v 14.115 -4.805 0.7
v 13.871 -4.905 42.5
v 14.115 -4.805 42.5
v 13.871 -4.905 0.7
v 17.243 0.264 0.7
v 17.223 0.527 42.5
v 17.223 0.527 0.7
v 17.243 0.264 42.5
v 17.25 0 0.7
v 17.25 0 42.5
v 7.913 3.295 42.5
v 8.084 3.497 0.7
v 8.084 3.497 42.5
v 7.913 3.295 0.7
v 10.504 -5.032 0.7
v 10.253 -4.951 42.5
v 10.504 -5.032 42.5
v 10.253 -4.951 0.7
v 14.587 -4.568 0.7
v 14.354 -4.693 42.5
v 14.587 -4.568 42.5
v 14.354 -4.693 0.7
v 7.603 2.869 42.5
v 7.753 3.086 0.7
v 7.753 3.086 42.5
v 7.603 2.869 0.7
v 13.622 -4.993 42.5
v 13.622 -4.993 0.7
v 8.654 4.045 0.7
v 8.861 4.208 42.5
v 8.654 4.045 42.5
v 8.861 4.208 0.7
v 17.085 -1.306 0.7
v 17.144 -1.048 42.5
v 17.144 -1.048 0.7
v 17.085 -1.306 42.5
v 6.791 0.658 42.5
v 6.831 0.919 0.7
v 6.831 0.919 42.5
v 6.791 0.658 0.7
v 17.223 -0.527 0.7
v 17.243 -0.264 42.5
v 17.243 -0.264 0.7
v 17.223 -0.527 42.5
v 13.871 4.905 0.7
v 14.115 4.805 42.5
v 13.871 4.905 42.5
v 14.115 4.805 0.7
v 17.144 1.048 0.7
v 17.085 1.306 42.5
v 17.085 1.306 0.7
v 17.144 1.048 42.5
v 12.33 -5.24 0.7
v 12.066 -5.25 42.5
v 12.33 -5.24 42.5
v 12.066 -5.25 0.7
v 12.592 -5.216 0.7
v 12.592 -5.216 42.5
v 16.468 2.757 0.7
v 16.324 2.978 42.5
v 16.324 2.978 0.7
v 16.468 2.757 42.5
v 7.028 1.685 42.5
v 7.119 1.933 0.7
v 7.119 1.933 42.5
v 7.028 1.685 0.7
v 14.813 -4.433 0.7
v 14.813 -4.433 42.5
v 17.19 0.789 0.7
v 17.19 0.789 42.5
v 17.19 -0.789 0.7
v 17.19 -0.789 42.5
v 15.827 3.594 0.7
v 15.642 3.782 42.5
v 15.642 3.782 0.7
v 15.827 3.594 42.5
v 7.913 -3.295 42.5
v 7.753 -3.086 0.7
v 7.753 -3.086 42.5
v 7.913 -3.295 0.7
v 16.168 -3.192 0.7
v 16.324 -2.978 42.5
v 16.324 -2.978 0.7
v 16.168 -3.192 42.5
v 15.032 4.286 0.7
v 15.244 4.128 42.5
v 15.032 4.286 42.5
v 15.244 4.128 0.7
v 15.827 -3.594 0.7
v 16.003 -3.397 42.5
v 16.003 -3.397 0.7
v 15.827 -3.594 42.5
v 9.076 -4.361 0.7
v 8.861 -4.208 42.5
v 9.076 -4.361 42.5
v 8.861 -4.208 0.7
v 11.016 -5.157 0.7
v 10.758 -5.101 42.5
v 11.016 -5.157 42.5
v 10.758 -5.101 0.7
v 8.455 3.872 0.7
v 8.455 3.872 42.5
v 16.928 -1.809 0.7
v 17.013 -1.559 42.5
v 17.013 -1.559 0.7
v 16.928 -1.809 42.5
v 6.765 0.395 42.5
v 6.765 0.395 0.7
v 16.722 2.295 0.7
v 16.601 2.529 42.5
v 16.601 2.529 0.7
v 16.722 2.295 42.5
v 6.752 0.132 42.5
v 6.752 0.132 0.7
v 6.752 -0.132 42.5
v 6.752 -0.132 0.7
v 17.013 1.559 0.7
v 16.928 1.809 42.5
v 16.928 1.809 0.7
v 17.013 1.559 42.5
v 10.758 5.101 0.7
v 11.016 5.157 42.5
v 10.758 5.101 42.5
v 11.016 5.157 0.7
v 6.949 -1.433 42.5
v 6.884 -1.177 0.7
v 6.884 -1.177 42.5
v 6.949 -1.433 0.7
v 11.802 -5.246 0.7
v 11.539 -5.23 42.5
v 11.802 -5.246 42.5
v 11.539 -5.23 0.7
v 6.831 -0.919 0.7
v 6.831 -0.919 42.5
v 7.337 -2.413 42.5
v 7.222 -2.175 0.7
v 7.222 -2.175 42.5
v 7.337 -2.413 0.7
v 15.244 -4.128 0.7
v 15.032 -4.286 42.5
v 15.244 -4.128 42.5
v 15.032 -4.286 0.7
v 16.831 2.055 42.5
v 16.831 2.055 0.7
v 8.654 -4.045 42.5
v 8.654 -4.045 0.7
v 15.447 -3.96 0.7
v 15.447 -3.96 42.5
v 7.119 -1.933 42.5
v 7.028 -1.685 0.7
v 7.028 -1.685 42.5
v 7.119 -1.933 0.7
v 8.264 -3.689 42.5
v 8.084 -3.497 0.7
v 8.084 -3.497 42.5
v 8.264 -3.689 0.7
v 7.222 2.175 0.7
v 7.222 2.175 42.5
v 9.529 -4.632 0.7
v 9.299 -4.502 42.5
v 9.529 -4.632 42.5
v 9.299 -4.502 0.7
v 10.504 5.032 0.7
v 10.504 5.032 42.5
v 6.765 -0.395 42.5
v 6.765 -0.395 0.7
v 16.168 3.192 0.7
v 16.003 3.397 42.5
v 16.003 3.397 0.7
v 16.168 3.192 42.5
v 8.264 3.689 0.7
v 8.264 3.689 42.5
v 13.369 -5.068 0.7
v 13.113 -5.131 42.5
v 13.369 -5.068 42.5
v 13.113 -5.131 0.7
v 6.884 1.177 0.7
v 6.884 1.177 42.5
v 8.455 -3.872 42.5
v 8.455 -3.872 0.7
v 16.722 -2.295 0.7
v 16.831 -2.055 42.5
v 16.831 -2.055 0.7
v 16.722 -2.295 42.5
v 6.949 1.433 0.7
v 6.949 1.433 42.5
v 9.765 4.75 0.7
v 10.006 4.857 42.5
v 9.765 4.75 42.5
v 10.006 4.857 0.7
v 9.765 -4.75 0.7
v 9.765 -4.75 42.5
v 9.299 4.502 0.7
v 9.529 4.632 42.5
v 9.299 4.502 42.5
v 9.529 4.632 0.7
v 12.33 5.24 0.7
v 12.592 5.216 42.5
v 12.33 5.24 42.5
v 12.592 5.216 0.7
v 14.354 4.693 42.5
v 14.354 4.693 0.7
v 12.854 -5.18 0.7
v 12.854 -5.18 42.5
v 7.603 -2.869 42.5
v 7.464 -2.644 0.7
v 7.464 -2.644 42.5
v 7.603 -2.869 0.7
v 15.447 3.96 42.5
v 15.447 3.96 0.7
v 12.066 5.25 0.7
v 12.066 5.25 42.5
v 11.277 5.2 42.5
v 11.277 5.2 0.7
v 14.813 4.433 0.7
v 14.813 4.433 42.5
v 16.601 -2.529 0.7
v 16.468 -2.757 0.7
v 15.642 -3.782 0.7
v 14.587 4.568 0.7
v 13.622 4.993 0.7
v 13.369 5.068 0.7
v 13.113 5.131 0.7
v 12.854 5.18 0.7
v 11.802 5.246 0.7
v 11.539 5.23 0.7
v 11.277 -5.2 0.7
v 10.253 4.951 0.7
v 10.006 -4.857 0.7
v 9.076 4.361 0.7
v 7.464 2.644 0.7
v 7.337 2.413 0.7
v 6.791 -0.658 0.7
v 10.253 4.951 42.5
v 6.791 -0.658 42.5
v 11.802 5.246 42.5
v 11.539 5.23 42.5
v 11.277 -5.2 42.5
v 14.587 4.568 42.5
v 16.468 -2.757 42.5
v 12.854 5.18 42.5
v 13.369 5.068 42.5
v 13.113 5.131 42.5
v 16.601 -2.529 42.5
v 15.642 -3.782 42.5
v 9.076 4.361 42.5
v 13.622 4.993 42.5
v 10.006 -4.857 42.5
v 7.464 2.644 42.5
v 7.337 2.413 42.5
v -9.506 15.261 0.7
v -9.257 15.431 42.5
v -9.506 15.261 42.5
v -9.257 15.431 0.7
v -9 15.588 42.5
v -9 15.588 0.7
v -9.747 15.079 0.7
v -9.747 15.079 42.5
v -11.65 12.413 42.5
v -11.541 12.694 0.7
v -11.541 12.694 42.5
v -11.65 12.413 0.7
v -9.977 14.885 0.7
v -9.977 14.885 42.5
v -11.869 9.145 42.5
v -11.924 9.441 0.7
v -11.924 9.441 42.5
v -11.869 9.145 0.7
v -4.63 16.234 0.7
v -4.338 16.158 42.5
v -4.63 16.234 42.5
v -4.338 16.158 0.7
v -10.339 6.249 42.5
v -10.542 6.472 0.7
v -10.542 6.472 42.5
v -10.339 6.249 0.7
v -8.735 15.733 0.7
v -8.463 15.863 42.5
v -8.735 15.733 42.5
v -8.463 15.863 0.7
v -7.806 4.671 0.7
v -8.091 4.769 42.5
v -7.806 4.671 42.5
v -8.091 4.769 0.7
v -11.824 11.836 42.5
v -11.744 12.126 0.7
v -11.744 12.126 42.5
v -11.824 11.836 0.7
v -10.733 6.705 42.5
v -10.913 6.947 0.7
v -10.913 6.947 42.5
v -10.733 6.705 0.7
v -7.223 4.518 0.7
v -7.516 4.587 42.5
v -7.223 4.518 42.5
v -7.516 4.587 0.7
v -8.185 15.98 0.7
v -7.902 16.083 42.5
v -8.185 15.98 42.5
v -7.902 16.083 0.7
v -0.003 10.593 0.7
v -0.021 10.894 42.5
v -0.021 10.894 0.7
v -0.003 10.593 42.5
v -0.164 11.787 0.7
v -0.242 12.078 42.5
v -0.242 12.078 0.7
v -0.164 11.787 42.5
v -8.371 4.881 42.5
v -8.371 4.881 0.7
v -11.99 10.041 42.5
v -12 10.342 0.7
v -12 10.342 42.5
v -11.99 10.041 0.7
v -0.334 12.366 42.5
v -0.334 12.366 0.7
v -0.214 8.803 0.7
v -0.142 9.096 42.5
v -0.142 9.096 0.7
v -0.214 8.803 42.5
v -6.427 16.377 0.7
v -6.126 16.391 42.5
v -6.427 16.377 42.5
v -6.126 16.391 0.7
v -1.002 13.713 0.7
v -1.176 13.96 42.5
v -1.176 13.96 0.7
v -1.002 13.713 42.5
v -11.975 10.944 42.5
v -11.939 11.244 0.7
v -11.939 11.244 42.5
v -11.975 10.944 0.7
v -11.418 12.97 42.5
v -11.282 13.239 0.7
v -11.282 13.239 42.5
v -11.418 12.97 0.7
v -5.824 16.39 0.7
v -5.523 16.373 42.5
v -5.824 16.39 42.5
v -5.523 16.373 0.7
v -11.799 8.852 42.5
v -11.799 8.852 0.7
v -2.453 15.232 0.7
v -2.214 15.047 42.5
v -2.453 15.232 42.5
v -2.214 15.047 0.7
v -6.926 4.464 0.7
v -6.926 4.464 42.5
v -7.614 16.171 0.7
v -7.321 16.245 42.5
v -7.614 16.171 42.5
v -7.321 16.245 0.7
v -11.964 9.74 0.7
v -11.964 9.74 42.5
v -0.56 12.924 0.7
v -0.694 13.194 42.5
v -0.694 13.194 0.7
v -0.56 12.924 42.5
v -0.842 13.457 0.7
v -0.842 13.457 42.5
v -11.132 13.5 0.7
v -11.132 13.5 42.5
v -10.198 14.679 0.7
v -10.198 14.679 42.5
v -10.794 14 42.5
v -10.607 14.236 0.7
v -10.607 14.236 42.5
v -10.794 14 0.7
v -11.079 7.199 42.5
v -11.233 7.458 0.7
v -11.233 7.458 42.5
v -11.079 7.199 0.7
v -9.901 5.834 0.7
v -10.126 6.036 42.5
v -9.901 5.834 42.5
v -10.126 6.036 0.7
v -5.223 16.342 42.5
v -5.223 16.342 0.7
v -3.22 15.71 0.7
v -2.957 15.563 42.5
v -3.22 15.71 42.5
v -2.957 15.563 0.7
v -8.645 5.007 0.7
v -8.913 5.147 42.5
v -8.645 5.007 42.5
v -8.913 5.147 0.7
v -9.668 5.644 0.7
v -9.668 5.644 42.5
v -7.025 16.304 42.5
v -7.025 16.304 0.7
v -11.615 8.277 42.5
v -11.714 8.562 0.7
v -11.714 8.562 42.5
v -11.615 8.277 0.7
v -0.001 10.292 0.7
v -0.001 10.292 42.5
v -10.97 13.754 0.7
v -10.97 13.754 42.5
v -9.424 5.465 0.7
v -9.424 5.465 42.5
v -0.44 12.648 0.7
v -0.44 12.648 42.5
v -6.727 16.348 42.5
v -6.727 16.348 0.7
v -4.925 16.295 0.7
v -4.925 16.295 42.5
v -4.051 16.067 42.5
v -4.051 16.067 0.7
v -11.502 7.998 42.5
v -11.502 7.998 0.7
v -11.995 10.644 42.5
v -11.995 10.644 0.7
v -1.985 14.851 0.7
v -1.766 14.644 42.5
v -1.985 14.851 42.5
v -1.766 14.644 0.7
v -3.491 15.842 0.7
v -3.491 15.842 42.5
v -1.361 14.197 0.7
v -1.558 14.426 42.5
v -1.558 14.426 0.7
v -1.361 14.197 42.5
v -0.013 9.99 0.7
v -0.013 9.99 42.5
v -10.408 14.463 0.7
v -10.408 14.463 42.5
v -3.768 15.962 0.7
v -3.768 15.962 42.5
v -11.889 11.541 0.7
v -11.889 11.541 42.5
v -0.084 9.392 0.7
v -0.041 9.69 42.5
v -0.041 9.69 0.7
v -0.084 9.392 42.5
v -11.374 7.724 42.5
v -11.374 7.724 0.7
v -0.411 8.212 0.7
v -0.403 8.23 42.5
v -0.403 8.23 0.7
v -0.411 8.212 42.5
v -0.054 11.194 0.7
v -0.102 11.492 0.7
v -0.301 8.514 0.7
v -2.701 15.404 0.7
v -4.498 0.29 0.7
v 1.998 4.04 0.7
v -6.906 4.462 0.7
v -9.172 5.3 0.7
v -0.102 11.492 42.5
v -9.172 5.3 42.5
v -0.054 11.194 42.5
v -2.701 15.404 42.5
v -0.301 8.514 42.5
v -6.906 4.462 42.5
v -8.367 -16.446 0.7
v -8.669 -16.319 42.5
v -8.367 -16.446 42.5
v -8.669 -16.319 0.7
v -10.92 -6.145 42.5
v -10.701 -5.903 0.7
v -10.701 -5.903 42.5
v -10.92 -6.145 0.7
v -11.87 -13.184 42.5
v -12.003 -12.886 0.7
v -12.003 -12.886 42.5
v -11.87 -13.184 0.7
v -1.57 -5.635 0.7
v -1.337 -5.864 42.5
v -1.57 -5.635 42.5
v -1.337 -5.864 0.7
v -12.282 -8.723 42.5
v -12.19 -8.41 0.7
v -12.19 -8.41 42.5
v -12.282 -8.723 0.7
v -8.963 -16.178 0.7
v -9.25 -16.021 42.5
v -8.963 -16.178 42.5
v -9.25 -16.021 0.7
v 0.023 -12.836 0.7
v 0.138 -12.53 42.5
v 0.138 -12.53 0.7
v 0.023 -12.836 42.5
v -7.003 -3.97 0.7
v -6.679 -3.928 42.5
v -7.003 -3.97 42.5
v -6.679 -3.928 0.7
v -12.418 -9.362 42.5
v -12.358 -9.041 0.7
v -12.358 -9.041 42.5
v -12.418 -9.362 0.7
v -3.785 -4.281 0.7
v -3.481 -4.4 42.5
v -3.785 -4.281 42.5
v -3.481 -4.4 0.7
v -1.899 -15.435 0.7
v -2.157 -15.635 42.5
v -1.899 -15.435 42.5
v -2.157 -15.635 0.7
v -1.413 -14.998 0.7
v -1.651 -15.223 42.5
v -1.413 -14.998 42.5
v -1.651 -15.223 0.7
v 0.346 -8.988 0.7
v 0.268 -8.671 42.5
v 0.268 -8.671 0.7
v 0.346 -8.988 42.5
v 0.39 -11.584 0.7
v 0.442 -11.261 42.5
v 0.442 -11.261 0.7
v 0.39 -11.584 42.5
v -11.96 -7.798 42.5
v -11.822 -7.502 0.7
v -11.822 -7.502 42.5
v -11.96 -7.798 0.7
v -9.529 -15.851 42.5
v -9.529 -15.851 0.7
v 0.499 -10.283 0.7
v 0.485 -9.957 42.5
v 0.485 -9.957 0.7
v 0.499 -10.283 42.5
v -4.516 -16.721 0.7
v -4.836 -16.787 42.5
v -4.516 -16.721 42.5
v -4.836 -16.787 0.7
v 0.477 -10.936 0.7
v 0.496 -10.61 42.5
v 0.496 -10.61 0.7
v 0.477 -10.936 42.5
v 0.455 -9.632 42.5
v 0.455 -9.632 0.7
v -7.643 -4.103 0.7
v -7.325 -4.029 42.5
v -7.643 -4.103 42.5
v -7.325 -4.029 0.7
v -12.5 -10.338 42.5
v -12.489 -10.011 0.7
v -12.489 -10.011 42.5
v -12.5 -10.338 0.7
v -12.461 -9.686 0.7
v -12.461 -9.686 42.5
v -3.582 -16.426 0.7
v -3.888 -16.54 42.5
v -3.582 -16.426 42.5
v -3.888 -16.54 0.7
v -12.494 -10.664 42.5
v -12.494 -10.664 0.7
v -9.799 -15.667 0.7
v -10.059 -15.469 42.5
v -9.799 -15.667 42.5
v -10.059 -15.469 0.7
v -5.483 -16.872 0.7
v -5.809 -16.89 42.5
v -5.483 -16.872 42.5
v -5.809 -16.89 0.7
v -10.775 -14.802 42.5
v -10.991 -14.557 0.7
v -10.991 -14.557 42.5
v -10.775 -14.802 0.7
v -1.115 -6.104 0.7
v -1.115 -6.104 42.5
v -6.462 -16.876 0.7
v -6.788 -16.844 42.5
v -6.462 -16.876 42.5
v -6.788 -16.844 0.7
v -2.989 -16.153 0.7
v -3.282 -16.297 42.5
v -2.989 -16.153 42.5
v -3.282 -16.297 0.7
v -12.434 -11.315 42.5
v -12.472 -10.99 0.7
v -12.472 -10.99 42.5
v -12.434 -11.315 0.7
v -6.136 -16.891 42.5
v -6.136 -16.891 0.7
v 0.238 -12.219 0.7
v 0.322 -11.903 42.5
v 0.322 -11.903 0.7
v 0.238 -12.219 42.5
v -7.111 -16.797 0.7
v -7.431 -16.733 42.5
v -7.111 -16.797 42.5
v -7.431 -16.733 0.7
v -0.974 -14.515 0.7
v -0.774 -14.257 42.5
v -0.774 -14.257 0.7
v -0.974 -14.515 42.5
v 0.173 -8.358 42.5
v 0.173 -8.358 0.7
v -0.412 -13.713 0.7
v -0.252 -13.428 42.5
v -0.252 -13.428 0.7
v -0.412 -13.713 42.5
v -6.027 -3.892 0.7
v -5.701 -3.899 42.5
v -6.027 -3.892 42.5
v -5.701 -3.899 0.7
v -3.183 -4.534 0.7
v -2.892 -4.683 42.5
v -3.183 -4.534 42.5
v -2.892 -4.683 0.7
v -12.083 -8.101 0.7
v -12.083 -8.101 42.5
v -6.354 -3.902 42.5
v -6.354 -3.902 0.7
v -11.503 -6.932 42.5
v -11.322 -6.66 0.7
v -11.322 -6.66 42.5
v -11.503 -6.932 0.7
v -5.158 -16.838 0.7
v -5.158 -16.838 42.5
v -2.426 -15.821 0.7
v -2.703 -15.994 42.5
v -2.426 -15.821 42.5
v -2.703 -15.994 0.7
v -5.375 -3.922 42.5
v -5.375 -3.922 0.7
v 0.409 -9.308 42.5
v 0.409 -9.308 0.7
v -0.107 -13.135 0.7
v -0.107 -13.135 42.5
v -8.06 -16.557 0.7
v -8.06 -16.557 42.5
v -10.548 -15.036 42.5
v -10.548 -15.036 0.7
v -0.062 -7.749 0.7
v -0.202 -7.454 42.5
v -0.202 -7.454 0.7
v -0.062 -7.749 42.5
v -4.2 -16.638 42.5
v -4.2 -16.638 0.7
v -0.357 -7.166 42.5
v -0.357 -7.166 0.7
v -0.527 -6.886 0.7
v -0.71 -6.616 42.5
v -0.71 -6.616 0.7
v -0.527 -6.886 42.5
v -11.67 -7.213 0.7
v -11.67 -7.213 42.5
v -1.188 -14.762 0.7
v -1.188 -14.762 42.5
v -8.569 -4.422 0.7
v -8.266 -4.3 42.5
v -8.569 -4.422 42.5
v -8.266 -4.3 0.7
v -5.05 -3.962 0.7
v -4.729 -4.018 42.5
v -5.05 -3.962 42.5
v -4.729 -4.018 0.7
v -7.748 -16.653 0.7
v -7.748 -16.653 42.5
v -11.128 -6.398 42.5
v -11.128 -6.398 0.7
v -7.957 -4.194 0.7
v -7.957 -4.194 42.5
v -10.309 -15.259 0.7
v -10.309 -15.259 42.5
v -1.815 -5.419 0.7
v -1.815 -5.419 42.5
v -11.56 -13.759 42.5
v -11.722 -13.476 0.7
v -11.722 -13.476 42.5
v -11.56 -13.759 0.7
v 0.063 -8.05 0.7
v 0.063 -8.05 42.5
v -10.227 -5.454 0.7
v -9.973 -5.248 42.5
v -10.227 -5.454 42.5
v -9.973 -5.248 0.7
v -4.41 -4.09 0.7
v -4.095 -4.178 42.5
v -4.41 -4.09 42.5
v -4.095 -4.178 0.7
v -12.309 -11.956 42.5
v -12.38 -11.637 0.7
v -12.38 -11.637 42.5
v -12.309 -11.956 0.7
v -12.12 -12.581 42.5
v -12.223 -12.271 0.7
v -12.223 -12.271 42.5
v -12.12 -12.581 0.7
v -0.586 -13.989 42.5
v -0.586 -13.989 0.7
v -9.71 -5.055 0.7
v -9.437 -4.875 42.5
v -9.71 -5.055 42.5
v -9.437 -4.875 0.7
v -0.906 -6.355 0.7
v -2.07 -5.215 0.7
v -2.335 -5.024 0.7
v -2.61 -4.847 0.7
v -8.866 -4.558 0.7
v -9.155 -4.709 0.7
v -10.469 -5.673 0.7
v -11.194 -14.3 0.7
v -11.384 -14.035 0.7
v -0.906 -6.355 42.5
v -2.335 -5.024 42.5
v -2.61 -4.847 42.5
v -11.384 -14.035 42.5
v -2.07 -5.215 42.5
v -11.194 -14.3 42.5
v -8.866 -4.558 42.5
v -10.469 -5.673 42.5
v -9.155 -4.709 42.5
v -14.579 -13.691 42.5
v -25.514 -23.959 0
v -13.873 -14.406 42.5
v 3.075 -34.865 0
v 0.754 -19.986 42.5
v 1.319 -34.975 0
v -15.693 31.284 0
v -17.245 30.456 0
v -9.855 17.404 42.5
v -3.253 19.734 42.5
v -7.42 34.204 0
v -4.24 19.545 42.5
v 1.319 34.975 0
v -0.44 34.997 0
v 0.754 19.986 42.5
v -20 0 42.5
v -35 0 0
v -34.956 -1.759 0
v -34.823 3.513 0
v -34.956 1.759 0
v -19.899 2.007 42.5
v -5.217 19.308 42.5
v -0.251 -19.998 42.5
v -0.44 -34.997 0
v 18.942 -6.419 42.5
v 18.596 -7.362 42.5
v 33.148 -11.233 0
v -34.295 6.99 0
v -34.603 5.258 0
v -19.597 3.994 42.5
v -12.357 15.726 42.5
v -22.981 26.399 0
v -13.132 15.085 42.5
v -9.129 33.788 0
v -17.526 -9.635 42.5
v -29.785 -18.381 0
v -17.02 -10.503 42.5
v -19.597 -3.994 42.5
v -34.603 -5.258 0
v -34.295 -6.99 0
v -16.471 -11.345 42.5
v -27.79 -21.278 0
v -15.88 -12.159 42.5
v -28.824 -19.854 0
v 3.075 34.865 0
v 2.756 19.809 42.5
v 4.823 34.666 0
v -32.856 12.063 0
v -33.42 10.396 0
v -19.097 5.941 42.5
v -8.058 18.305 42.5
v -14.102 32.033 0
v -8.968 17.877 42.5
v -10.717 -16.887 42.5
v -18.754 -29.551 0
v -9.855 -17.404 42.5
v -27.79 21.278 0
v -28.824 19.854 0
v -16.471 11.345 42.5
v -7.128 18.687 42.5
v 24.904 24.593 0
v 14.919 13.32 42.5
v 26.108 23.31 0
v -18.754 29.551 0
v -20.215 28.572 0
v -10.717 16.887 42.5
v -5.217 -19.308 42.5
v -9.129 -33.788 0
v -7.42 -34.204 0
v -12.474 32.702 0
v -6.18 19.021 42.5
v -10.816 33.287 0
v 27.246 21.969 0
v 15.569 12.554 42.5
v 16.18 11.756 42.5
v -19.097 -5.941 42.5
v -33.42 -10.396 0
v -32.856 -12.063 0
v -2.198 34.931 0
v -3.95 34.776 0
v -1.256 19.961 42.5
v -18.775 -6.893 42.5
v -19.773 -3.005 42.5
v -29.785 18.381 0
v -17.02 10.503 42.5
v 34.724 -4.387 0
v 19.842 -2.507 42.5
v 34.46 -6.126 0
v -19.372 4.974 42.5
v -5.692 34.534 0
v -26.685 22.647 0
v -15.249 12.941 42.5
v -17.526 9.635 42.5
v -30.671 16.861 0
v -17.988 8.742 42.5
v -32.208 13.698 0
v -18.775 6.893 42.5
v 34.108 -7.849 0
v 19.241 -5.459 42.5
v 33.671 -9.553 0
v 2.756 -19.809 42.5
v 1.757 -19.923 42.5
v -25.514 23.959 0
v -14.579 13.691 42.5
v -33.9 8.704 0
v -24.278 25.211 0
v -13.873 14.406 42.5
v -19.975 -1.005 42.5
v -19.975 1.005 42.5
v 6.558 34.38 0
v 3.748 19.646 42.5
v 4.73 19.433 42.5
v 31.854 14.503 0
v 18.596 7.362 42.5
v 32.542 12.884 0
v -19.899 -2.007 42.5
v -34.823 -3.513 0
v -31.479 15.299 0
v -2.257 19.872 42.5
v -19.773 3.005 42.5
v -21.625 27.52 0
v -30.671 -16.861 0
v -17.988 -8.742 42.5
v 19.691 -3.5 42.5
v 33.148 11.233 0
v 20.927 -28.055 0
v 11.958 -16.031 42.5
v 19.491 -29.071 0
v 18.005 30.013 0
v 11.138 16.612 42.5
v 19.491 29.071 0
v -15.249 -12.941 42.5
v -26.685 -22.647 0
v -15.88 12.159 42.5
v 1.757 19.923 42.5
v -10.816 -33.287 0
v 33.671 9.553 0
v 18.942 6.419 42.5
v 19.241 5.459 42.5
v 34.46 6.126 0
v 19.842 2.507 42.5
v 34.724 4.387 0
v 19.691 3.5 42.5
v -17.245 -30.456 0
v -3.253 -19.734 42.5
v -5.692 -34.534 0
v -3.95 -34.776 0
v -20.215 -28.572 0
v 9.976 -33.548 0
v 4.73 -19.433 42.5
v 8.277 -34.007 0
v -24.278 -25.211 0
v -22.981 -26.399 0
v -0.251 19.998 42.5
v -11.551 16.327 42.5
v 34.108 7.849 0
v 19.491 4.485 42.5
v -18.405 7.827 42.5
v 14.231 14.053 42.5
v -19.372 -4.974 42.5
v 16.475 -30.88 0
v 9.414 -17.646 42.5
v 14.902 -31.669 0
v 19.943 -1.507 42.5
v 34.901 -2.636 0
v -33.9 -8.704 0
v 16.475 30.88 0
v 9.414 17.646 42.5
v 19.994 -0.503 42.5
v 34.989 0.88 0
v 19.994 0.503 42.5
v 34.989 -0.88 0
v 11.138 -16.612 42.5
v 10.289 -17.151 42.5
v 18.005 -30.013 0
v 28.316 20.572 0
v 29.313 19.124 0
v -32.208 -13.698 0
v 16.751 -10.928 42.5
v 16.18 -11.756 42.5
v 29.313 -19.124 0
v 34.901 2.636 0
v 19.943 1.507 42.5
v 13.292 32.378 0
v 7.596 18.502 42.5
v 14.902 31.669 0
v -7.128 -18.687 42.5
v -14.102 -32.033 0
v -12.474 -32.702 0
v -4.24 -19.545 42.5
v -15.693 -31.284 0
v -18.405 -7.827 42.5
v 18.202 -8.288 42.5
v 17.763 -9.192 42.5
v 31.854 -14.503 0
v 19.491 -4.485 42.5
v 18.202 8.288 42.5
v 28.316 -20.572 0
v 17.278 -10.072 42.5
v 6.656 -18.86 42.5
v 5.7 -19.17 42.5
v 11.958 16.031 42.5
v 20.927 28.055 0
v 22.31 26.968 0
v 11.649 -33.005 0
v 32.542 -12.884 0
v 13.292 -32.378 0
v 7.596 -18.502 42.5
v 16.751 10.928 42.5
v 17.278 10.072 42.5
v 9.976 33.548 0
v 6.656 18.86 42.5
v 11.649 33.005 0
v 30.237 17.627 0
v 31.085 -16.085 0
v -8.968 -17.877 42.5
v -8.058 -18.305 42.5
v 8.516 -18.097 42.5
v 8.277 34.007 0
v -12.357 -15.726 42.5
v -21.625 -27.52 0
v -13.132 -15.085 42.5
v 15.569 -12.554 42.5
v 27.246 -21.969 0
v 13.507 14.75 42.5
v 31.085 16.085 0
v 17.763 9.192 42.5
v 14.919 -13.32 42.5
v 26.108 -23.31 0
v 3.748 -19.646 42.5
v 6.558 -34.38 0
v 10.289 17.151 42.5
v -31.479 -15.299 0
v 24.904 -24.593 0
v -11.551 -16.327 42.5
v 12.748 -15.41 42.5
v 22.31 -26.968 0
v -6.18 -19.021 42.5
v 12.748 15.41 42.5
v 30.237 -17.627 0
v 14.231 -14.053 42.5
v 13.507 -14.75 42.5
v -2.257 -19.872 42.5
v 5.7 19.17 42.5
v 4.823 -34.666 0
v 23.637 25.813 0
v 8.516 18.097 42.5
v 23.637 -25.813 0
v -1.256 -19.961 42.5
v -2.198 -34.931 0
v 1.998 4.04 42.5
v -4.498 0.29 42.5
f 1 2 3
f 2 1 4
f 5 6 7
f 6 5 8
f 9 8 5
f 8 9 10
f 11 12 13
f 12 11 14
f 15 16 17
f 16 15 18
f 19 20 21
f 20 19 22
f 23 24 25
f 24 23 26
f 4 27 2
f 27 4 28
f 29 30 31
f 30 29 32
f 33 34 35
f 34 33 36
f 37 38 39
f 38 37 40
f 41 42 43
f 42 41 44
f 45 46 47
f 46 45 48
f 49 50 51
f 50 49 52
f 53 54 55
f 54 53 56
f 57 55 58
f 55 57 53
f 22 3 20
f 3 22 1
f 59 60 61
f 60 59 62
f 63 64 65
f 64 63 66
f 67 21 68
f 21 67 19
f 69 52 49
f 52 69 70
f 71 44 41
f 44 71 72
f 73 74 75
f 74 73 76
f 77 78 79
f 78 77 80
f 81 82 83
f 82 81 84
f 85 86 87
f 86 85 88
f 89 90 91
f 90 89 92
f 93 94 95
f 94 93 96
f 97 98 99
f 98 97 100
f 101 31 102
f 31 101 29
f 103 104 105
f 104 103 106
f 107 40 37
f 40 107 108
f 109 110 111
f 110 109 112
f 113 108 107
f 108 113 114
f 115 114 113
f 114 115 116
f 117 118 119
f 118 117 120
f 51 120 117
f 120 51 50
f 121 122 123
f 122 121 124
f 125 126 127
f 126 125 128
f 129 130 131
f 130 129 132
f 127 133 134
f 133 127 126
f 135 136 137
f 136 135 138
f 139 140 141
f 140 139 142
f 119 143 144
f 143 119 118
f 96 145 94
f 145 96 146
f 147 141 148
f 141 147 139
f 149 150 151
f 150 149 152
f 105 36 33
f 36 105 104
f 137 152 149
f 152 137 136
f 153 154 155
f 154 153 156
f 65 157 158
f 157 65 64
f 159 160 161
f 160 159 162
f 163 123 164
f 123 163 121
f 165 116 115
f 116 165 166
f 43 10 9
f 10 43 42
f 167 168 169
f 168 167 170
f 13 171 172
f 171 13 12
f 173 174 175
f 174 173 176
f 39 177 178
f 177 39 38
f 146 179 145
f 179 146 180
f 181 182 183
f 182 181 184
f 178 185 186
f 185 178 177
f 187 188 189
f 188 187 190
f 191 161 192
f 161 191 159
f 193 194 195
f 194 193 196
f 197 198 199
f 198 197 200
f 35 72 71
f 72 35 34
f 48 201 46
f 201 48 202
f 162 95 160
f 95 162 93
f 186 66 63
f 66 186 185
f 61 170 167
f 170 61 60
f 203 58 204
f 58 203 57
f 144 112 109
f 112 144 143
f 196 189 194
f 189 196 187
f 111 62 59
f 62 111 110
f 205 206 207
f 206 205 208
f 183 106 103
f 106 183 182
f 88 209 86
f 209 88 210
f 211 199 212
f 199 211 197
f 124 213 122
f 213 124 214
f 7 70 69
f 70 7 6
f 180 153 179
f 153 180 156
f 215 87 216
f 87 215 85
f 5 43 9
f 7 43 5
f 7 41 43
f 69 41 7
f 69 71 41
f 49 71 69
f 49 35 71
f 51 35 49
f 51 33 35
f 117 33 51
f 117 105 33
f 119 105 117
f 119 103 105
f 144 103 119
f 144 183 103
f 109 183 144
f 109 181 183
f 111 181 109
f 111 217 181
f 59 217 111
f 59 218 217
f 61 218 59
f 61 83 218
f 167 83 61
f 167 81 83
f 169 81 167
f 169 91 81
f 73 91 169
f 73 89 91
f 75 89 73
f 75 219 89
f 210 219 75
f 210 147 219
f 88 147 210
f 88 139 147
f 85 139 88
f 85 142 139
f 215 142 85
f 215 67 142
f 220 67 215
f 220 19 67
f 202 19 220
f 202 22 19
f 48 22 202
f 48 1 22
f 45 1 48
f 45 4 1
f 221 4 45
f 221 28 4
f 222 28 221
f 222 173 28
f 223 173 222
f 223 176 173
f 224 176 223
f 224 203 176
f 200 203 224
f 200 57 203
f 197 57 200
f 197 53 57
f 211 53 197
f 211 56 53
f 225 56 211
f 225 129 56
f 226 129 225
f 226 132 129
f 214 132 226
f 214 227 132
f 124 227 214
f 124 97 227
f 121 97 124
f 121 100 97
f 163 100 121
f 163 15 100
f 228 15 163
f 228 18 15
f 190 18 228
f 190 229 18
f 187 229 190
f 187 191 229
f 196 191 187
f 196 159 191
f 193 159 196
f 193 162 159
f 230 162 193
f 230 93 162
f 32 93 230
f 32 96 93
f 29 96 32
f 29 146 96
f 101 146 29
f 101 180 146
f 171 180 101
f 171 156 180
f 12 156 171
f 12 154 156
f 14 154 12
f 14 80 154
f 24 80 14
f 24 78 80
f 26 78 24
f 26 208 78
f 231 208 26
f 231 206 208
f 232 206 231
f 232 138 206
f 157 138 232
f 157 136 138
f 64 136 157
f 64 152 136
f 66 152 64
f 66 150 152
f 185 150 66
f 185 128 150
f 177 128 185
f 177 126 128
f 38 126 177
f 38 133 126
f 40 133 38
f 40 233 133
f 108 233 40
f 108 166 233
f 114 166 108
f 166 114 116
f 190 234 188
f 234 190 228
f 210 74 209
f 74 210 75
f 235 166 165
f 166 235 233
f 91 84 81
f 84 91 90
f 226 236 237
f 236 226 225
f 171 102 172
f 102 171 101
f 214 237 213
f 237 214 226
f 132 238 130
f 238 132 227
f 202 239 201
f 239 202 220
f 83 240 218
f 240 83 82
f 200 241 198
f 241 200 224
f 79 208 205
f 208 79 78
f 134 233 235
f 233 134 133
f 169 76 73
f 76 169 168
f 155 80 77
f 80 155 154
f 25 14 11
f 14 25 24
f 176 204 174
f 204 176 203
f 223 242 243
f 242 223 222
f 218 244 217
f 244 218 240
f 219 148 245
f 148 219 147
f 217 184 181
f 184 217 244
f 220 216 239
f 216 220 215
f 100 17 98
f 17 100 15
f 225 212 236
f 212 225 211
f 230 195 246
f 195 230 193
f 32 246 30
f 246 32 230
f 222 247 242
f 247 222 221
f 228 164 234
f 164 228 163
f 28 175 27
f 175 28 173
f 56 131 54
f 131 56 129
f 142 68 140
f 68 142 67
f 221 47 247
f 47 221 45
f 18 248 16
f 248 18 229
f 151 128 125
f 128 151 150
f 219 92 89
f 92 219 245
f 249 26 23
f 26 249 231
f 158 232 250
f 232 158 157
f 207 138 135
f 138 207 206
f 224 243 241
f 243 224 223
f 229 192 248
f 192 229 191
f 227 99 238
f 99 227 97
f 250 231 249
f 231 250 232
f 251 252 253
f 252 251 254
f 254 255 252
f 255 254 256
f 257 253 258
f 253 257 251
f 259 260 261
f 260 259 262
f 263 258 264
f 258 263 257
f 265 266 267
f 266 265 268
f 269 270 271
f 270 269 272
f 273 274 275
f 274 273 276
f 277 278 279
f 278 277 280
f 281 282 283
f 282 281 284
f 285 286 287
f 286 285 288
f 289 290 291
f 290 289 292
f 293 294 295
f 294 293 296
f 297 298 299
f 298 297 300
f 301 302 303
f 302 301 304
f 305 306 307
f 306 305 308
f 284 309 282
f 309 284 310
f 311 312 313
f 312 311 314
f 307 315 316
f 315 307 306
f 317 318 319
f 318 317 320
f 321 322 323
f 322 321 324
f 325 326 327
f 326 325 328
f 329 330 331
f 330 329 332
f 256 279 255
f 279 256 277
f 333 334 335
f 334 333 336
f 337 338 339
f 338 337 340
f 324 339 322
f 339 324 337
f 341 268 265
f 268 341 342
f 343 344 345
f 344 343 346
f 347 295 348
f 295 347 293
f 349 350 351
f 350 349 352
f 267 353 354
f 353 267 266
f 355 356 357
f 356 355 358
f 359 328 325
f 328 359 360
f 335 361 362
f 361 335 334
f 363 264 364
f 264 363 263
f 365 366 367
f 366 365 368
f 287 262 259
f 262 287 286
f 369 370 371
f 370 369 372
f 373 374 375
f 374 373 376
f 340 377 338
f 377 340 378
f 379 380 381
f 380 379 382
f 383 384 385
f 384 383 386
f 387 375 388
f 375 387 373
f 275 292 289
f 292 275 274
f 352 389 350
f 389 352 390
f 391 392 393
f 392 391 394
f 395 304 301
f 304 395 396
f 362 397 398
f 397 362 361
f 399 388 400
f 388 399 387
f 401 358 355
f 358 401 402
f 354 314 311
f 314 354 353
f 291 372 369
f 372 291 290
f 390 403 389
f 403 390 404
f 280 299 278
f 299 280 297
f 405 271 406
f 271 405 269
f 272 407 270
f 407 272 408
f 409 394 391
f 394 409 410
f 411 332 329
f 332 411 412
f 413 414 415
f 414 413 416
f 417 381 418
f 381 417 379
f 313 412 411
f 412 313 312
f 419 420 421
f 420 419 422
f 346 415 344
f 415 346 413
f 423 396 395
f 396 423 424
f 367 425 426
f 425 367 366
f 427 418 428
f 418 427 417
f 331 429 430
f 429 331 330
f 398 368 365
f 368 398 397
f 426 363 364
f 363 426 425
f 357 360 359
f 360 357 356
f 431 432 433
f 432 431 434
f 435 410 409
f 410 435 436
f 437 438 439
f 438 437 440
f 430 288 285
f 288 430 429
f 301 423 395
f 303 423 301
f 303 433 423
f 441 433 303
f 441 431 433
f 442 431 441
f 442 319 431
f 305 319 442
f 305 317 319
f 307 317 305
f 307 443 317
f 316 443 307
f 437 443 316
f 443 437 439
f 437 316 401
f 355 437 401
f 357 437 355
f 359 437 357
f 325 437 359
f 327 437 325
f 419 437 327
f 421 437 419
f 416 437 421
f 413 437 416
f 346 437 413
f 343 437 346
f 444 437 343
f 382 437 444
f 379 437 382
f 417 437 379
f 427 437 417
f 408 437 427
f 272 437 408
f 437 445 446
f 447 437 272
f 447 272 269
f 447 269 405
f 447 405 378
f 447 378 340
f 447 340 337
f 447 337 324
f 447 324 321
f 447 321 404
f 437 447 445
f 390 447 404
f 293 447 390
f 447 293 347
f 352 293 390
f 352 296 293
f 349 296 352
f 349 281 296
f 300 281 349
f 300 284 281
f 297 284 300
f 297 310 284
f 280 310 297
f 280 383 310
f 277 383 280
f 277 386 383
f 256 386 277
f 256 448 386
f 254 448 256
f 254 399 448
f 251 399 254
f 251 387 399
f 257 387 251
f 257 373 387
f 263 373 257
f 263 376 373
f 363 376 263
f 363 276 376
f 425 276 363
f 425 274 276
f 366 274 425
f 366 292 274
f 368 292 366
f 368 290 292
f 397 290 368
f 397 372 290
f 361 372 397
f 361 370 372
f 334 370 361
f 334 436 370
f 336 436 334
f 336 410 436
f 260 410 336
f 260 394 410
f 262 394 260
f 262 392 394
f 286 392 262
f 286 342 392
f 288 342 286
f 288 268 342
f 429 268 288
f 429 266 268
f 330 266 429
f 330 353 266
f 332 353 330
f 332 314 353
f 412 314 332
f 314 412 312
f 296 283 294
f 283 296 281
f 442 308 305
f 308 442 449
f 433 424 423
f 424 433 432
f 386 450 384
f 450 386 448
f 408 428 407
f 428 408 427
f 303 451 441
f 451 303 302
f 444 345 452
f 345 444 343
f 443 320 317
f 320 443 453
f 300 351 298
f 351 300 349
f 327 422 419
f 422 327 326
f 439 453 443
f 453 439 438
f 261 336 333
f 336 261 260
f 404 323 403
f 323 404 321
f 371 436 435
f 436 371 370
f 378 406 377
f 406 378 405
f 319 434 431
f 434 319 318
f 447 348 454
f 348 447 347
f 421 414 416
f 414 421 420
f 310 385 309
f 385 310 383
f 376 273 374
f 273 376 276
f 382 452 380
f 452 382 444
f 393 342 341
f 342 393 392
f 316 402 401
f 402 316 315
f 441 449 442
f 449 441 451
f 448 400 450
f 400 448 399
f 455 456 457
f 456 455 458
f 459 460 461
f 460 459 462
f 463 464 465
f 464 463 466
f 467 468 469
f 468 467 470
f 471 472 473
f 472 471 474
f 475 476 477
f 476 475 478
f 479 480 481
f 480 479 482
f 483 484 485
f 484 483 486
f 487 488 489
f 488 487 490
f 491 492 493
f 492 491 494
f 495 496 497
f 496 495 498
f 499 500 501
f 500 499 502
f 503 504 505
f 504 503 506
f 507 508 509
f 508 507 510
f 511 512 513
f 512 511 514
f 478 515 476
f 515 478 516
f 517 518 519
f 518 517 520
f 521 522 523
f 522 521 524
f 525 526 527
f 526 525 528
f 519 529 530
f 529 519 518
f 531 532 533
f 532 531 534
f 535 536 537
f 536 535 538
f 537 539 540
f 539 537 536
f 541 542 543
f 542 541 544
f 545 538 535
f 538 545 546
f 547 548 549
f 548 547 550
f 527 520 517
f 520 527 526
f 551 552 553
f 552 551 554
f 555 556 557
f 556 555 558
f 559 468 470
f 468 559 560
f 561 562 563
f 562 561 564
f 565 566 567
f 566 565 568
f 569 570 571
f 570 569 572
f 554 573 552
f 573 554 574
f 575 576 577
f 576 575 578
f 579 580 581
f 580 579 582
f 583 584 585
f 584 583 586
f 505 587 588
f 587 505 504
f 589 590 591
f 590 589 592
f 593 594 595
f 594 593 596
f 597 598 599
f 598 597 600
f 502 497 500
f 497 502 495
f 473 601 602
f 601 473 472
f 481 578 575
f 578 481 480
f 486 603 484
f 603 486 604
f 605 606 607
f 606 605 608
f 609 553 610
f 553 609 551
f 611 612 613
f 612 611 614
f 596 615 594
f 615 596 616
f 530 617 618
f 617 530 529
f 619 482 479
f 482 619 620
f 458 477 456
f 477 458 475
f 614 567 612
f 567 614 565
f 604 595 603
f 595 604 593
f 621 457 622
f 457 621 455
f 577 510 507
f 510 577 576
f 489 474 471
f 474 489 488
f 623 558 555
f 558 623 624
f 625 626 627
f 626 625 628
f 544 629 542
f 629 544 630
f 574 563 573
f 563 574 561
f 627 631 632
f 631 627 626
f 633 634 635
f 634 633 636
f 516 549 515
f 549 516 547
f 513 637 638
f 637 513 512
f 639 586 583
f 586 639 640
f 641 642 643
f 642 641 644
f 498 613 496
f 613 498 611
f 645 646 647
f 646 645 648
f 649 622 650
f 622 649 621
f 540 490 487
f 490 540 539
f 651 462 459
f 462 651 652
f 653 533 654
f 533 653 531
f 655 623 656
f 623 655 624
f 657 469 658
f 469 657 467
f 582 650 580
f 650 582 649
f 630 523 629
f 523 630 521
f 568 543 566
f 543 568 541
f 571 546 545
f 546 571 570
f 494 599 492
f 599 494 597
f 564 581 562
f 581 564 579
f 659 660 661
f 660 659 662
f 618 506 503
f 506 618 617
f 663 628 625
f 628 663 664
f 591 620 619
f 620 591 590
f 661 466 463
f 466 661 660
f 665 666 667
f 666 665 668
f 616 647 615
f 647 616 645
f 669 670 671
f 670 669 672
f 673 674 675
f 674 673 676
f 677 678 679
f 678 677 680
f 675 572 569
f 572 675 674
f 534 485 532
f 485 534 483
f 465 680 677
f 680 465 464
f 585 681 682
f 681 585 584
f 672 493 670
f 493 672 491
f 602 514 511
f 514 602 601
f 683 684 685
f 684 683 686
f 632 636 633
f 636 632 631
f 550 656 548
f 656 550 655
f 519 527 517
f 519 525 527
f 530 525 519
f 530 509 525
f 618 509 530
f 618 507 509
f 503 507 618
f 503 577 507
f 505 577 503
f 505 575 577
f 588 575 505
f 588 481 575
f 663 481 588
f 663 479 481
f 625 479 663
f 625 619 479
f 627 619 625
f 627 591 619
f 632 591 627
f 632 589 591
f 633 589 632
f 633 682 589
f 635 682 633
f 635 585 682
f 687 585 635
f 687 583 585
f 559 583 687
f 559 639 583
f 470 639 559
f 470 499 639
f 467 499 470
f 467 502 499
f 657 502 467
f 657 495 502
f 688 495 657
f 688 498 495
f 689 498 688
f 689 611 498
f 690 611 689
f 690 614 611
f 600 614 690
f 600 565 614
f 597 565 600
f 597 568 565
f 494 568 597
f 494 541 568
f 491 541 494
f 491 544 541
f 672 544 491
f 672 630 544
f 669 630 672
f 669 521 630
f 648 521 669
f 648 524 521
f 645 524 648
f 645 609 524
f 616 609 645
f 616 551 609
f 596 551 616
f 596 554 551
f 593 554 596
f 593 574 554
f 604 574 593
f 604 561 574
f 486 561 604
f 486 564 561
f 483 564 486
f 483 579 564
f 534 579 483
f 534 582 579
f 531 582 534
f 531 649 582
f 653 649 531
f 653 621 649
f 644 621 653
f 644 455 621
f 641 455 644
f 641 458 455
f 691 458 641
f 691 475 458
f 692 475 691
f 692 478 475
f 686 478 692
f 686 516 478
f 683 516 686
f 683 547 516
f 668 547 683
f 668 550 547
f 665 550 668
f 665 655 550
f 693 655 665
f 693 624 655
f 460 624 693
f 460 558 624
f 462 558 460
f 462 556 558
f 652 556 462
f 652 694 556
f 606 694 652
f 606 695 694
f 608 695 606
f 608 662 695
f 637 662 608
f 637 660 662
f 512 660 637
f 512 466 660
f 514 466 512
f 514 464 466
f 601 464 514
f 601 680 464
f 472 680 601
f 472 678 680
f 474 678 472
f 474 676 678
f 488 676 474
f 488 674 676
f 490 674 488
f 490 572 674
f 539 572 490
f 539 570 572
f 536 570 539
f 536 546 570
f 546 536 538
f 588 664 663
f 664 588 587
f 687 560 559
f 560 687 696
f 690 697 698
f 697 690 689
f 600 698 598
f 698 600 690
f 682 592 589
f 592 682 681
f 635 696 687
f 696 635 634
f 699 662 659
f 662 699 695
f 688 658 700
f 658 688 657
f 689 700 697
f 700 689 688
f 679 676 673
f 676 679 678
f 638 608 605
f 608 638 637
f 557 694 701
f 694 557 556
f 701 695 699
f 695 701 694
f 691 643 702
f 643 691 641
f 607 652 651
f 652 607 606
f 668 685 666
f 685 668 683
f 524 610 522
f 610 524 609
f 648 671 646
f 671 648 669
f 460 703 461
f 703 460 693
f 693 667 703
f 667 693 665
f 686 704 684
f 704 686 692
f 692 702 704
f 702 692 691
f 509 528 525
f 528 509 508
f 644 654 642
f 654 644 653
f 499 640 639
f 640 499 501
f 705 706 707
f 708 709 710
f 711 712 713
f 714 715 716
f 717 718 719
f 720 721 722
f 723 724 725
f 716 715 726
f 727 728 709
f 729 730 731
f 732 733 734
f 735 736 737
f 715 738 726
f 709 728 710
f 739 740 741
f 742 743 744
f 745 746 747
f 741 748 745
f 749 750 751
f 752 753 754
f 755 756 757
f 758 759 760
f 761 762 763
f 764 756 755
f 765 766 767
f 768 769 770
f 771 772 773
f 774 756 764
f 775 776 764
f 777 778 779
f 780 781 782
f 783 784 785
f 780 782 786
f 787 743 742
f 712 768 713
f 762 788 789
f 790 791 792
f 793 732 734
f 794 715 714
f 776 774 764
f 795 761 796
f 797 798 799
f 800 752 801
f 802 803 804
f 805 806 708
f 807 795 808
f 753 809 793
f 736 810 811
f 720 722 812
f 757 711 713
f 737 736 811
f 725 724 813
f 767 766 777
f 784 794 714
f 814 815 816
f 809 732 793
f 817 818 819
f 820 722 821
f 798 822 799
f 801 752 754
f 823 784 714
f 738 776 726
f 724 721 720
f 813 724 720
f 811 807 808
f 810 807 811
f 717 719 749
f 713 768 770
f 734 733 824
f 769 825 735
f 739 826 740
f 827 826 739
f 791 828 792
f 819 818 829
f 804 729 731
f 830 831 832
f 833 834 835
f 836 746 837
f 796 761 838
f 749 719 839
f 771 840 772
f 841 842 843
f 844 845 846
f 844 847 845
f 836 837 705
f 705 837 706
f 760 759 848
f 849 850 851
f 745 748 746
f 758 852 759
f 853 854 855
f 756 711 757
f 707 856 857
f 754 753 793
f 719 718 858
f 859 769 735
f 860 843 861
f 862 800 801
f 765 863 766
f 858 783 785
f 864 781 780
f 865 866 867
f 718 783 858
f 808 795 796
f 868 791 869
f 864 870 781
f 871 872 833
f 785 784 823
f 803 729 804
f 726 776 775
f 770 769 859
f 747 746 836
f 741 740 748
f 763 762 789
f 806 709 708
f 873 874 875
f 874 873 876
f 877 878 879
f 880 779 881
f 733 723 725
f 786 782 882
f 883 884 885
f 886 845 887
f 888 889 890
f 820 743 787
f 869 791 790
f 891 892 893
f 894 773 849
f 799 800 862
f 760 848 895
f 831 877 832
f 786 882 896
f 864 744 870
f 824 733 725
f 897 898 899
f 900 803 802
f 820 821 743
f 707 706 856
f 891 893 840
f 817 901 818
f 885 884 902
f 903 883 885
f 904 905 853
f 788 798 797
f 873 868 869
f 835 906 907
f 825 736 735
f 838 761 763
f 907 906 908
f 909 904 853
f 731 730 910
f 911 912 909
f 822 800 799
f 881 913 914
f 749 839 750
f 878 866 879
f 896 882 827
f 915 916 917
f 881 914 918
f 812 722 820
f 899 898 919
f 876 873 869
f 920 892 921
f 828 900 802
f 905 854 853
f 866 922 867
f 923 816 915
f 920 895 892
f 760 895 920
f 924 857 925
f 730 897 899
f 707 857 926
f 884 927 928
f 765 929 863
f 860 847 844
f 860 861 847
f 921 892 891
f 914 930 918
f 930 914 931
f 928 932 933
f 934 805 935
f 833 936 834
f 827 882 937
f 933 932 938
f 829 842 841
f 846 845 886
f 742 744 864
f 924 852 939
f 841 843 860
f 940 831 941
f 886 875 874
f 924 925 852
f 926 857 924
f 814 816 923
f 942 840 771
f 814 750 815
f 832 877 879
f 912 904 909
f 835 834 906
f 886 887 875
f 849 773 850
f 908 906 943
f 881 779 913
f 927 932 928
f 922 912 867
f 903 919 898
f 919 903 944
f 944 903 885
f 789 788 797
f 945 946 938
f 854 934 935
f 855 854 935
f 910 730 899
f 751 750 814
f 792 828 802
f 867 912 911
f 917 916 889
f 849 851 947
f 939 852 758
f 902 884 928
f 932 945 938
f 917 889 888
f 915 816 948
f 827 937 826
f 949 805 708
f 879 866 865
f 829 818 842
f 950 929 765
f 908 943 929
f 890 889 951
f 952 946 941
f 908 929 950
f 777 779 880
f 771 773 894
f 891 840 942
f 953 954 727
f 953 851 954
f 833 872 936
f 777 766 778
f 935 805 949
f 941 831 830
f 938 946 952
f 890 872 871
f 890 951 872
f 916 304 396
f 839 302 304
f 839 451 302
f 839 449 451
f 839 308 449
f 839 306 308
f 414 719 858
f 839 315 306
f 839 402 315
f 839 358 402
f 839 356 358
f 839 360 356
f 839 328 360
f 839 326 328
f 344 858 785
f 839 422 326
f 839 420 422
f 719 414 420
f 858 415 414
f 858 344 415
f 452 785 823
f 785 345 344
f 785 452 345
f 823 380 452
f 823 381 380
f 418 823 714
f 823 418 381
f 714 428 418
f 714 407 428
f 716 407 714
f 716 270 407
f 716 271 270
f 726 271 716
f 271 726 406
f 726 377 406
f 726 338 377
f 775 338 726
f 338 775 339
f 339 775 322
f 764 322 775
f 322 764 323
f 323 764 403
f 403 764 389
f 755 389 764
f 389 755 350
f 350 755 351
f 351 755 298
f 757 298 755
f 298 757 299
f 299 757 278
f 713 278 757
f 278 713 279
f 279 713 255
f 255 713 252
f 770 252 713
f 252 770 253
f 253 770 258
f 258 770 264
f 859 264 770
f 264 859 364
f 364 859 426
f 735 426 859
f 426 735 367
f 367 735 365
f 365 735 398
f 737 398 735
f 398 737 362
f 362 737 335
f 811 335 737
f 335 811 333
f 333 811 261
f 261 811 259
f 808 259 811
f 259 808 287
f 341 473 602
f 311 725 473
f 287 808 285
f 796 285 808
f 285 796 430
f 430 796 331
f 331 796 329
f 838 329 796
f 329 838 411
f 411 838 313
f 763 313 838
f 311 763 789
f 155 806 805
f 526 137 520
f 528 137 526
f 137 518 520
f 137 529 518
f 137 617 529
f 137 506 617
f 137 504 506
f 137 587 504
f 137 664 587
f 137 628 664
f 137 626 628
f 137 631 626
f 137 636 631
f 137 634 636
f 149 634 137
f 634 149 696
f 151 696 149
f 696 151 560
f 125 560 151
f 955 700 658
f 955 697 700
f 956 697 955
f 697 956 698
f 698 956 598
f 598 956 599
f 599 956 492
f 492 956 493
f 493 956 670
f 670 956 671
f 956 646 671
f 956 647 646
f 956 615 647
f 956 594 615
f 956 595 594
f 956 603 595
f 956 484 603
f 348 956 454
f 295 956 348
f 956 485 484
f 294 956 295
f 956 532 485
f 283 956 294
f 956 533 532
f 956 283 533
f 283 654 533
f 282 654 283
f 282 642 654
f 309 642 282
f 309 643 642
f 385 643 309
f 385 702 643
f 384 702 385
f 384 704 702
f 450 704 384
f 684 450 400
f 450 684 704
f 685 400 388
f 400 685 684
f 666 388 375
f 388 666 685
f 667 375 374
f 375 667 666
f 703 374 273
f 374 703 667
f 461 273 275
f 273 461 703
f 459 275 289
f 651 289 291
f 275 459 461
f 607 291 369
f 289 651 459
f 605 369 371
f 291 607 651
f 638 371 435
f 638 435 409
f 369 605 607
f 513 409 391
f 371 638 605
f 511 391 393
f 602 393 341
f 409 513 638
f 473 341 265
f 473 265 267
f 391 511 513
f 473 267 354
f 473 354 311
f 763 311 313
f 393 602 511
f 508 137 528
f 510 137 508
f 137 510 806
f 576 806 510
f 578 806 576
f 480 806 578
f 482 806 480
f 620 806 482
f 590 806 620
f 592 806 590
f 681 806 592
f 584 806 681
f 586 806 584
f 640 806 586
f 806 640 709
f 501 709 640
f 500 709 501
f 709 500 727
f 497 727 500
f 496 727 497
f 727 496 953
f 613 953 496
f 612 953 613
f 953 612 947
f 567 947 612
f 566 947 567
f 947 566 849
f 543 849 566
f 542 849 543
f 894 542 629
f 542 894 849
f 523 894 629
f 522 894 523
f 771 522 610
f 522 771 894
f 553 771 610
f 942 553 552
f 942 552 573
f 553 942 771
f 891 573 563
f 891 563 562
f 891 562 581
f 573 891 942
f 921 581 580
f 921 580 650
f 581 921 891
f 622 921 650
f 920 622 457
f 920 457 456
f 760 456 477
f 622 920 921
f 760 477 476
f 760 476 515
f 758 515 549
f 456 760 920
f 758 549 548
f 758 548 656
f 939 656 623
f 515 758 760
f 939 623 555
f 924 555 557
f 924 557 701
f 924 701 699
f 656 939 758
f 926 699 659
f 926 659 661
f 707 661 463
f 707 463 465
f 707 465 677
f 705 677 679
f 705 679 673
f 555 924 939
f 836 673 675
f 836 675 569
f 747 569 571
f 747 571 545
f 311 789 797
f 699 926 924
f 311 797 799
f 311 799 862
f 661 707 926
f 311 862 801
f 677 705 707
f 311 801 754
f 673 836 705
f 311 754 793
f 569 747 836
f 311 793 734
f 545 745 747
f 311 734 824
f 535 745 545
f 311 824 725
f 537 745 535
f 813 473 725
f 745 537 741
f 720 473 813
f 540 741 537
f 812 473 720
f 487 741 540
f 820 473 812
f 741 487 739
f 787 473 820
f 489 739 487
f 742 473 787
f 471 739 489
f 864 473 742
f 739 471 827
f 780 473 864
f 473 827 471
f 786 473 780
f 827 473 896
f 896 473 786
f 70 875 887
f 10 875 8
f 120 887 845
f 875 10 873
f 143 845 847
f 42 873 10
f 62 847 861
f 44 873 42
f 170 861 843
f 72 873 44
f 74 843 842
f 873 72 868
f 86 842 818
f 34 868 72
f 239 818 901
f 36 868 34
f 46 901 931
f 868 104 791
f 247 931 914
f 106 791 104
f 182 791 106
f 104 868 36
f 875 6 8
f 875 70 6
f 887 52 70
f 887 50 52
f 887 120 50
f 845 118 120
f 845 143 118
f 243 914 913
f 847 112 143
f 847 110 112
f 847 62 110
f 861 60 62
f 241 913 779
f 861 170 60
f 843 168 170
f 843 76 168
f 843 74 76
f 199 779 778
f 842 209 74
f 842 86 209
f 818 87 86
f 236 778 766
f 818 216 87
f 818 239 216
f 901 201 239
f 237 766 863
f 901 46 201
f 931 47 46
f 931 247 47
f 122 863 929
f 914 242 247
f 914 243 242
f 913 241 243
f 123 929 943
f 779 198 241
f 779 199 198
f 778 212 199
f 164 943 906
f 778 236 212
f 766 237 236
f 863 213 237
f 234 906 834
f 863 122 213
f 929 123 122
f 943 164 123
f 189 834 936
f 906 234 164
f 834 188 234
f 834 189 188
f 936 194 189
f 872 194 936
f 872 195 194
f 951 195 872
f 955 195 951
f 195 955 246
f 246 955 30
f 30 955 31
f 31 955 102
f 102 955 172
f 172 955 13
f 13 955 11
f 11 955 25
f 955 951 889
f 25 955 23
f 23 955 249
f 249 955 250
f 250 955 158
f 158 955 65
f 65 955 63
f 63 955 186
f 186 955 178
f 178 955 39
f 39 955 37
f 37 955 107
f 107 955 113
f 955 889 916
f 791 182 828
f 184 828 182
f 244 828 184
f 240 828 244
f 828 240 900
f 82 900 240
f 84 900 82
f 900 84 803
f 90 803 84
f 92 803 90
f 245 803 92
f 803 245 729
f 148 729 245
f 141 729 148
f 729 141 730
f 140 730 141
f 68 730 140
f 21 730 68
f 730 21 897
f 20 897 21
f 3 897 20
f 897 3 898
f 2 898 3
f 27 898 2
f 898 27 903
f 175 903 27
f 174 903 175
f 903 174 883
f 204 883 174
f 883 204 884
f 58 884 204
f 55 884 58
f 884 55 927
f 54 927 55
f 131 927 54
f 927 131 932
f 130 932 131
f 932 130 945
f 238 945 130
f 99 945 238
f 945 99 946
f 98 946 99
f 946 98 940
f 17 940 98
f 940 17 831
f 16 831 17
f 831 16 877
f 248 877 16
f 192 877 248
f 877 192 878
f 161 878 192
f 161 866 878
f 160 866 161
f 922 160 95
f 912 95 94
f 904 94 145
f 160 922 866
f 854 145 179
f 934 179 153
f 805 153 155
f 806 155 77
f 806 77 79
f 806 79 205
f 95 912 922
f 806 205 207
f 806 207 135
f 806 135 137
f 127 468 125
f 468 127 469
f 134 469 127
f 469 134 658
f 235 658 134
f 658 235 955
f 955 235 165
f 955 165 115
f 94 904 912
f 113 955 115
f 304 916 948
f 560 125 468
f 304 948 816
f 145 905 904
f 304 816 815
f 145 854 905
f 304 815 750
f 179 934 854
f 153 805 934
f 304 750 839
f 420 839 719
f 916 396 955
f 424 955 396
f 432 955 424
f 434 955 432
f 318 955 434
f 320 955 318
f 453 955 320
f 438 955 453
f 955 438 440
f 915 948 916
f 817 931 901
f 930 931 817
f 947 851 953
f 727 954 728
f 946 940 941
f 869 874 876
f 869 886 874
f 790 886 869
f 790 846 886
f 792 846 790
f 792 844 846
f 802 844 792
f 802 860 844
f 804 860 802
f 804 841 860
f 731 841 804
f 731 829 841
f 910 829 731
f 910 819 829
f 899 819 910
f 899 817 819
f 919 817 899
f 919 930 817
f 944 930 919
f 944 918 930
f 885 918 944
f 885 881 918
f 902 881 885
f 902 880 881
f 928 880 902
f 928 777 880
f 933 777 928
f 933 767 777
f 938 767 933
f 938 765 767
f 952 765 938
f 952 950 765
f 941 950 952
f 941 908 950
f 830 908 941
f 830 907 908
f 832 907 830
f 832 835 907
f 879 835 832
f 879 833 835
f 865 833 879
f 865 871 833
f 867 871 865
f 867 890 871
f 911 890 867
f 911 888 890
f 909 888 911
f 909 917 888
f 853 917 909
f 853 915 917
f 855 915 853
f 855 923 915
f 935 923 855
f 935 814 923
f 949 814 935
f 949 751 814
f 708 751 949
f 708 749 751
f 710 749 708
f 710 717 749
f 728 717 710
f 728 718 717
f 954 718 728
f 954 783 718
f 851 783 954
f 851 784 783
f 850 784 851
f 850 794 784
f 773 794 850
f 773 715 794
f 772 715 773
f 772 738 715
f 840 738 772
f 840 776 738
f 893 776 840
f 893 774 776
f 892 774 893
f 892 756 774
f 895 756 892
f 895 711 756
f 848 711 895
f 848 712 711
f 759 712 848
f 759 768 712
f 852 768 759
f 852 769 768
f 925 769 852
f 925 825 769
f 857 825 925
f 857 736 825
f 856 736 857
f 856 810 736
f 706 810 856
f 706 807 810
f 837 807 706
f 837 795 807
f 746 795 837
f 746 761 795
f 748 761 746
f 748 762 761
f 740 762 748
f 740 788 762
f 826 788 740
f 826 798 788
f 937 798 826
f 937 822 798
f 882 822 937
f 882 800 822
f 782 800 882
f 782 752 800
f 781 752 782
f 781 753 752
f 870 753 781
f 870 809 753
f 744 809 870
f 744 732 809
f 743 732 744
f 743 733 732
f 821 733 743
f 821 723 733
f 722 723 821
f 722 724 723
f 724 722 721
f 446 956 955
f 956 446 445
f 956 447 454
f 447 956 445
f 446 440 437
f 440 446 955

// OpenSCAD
// created by AkytharPandaaa

$fn = $preview? 25:125;

difference() {
  rotate_extrude(angle = 360, convexity = 2) {
    polygon(points = [
      [0,0], [35,0], [20,42.5],[0,42.5]
    ]);
  }

  ods = [10.5, 12, 13];
  for (i=[0:2]) {
    rotate(a = 120*i, v = [0,0,1]) 
      translate([12, 0, .7])
        cylinder(h = 42, d=ods[i], center = false);
  }

  rotate(a = 120, v = [0,0,1]) 
    translate(v = [2.5, -(7.5/2), .7])
      cube(size = [5, 7.5, 42], center = false);
}
